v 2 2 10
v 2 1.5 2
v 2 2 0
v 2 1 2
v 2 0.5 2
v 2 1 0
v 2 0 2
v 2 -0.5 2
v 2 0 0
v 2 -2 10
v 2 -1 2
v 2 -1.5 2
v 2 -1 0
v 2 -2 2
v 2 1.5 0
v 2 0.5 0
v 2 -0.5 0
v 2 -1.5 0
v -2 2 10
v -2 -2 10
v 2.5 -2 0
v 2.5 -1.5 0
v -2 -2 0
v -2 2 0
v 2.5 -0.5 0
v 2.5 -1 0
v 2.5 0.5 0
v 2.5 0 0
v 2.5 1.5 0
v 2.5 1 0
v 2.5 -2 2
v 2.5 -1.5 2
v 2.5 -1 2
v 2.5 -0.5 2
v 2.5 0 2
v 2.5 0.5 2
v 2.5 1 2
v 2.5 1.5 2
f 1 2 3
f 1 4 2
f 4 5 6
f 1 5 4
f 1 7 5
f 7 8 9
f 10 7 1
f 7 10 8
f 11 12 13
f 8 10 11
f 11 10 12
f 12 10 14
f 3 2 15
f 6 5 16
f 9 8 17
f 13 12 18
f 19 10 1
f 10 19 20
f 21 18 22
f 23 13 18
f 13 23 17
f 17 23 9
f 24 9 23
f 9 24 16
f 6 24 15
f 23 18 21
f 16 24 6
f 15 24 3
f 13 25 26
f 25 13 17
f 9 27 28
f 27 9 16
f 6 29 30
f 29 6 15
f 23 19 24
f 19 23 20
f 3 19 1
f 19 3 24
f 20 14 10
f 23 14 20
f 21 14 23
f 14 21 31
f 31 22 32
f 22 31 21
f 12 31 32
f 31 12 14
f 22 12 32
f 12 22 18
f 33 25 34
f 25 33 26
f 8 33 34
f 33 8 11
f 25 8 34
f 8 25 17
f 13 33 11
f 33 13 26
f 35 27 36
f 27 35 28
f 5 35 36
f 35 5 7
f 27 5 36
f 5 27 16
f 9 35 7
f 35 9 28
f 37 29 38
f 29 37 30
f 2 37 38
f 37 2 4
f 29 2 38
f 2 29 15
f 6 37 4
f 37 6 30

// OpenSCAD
translate([0, 0, 5]) color([0,1,0,0.9]) cube([4, 4, 10], center=true);
translate([-1.75, -1.75, 1]) color([1,0,0]) cube([0.5, 0.5, 2], center=true);
translate([-1.75, -0.75, 1]) color([1,0,0]) cube([0.5, 0.5, 2], center=true);
translate([-1.75, 0.25, 1]) color([1,0,0]) cube([0.5, 0.5, 2], center=true);
translate([-1.75, 1.25, 1]) color([1,0,0]) cube([0.5, 0.5, 2], center=true);
translate([-0.75, -1.75, 1]) color([1,0,0]) cube([0.5, 0.5, 2], center=true);
translate([-0.75, -0.75, 1]) color([1,0,0]) cube([0.5, 0.5, 2], center=true);
translate([-0.75, 0.25, 1]) color([1,0,0]) cube([0.5, 0.5, 2], center=true);
translate([-0.75, 1.25, 1]) color([1,0,0]) cube([0.5, 0.5, 2], center=true);
translate([0.25, -1.75, 1]) color([1,0,0]) cube([0.5, 0.5, 2], center=true);
translate([0.25, -0.75, 1]) color([1,0,0]) cube([0.5, 0.5, 2], center=true);
translate([0.25, 0.25, 1]) color([1,0,0]) cube([0.5, 0.5, 2], center=true);
translate([0.25, 1.25, 1]) color([1,0,0]) cube([0.5, 0.5, 2], center=true);
translate([1.25, -1.75, 1]) color([1,0,0]) cube([0.5, 0.5, 2], center=true);
translate([1.25, -0.75, 1]) color([1,0,0]) cube([0.5, 0.5, 2], center=true);
translate([1.25, 0.25, 1]) color([1,0,0]) cube([0.5, 0.5, 2], center=true);
translate([1.25, 1.25, 1]) color([1,0,0]) cube([0.5, 0.5, 2], center=true);
translate([2.25, -1.75, 1]) color([1,0,0]) cube([0.5, 0.5, 2], center=true);
translate([2.25, -0.75, 1]) color([1,0,0]) cube([0.5, 0.5, 2], center=true);
translate([2.25, 0.25, 1]) color([1,0,0]) cube([0.5, 0.5, 2], center=true);
translate([2.25, 1.25, 1]) color([1,0,0]) cube([0.5, 0.5, 2], center=true);
